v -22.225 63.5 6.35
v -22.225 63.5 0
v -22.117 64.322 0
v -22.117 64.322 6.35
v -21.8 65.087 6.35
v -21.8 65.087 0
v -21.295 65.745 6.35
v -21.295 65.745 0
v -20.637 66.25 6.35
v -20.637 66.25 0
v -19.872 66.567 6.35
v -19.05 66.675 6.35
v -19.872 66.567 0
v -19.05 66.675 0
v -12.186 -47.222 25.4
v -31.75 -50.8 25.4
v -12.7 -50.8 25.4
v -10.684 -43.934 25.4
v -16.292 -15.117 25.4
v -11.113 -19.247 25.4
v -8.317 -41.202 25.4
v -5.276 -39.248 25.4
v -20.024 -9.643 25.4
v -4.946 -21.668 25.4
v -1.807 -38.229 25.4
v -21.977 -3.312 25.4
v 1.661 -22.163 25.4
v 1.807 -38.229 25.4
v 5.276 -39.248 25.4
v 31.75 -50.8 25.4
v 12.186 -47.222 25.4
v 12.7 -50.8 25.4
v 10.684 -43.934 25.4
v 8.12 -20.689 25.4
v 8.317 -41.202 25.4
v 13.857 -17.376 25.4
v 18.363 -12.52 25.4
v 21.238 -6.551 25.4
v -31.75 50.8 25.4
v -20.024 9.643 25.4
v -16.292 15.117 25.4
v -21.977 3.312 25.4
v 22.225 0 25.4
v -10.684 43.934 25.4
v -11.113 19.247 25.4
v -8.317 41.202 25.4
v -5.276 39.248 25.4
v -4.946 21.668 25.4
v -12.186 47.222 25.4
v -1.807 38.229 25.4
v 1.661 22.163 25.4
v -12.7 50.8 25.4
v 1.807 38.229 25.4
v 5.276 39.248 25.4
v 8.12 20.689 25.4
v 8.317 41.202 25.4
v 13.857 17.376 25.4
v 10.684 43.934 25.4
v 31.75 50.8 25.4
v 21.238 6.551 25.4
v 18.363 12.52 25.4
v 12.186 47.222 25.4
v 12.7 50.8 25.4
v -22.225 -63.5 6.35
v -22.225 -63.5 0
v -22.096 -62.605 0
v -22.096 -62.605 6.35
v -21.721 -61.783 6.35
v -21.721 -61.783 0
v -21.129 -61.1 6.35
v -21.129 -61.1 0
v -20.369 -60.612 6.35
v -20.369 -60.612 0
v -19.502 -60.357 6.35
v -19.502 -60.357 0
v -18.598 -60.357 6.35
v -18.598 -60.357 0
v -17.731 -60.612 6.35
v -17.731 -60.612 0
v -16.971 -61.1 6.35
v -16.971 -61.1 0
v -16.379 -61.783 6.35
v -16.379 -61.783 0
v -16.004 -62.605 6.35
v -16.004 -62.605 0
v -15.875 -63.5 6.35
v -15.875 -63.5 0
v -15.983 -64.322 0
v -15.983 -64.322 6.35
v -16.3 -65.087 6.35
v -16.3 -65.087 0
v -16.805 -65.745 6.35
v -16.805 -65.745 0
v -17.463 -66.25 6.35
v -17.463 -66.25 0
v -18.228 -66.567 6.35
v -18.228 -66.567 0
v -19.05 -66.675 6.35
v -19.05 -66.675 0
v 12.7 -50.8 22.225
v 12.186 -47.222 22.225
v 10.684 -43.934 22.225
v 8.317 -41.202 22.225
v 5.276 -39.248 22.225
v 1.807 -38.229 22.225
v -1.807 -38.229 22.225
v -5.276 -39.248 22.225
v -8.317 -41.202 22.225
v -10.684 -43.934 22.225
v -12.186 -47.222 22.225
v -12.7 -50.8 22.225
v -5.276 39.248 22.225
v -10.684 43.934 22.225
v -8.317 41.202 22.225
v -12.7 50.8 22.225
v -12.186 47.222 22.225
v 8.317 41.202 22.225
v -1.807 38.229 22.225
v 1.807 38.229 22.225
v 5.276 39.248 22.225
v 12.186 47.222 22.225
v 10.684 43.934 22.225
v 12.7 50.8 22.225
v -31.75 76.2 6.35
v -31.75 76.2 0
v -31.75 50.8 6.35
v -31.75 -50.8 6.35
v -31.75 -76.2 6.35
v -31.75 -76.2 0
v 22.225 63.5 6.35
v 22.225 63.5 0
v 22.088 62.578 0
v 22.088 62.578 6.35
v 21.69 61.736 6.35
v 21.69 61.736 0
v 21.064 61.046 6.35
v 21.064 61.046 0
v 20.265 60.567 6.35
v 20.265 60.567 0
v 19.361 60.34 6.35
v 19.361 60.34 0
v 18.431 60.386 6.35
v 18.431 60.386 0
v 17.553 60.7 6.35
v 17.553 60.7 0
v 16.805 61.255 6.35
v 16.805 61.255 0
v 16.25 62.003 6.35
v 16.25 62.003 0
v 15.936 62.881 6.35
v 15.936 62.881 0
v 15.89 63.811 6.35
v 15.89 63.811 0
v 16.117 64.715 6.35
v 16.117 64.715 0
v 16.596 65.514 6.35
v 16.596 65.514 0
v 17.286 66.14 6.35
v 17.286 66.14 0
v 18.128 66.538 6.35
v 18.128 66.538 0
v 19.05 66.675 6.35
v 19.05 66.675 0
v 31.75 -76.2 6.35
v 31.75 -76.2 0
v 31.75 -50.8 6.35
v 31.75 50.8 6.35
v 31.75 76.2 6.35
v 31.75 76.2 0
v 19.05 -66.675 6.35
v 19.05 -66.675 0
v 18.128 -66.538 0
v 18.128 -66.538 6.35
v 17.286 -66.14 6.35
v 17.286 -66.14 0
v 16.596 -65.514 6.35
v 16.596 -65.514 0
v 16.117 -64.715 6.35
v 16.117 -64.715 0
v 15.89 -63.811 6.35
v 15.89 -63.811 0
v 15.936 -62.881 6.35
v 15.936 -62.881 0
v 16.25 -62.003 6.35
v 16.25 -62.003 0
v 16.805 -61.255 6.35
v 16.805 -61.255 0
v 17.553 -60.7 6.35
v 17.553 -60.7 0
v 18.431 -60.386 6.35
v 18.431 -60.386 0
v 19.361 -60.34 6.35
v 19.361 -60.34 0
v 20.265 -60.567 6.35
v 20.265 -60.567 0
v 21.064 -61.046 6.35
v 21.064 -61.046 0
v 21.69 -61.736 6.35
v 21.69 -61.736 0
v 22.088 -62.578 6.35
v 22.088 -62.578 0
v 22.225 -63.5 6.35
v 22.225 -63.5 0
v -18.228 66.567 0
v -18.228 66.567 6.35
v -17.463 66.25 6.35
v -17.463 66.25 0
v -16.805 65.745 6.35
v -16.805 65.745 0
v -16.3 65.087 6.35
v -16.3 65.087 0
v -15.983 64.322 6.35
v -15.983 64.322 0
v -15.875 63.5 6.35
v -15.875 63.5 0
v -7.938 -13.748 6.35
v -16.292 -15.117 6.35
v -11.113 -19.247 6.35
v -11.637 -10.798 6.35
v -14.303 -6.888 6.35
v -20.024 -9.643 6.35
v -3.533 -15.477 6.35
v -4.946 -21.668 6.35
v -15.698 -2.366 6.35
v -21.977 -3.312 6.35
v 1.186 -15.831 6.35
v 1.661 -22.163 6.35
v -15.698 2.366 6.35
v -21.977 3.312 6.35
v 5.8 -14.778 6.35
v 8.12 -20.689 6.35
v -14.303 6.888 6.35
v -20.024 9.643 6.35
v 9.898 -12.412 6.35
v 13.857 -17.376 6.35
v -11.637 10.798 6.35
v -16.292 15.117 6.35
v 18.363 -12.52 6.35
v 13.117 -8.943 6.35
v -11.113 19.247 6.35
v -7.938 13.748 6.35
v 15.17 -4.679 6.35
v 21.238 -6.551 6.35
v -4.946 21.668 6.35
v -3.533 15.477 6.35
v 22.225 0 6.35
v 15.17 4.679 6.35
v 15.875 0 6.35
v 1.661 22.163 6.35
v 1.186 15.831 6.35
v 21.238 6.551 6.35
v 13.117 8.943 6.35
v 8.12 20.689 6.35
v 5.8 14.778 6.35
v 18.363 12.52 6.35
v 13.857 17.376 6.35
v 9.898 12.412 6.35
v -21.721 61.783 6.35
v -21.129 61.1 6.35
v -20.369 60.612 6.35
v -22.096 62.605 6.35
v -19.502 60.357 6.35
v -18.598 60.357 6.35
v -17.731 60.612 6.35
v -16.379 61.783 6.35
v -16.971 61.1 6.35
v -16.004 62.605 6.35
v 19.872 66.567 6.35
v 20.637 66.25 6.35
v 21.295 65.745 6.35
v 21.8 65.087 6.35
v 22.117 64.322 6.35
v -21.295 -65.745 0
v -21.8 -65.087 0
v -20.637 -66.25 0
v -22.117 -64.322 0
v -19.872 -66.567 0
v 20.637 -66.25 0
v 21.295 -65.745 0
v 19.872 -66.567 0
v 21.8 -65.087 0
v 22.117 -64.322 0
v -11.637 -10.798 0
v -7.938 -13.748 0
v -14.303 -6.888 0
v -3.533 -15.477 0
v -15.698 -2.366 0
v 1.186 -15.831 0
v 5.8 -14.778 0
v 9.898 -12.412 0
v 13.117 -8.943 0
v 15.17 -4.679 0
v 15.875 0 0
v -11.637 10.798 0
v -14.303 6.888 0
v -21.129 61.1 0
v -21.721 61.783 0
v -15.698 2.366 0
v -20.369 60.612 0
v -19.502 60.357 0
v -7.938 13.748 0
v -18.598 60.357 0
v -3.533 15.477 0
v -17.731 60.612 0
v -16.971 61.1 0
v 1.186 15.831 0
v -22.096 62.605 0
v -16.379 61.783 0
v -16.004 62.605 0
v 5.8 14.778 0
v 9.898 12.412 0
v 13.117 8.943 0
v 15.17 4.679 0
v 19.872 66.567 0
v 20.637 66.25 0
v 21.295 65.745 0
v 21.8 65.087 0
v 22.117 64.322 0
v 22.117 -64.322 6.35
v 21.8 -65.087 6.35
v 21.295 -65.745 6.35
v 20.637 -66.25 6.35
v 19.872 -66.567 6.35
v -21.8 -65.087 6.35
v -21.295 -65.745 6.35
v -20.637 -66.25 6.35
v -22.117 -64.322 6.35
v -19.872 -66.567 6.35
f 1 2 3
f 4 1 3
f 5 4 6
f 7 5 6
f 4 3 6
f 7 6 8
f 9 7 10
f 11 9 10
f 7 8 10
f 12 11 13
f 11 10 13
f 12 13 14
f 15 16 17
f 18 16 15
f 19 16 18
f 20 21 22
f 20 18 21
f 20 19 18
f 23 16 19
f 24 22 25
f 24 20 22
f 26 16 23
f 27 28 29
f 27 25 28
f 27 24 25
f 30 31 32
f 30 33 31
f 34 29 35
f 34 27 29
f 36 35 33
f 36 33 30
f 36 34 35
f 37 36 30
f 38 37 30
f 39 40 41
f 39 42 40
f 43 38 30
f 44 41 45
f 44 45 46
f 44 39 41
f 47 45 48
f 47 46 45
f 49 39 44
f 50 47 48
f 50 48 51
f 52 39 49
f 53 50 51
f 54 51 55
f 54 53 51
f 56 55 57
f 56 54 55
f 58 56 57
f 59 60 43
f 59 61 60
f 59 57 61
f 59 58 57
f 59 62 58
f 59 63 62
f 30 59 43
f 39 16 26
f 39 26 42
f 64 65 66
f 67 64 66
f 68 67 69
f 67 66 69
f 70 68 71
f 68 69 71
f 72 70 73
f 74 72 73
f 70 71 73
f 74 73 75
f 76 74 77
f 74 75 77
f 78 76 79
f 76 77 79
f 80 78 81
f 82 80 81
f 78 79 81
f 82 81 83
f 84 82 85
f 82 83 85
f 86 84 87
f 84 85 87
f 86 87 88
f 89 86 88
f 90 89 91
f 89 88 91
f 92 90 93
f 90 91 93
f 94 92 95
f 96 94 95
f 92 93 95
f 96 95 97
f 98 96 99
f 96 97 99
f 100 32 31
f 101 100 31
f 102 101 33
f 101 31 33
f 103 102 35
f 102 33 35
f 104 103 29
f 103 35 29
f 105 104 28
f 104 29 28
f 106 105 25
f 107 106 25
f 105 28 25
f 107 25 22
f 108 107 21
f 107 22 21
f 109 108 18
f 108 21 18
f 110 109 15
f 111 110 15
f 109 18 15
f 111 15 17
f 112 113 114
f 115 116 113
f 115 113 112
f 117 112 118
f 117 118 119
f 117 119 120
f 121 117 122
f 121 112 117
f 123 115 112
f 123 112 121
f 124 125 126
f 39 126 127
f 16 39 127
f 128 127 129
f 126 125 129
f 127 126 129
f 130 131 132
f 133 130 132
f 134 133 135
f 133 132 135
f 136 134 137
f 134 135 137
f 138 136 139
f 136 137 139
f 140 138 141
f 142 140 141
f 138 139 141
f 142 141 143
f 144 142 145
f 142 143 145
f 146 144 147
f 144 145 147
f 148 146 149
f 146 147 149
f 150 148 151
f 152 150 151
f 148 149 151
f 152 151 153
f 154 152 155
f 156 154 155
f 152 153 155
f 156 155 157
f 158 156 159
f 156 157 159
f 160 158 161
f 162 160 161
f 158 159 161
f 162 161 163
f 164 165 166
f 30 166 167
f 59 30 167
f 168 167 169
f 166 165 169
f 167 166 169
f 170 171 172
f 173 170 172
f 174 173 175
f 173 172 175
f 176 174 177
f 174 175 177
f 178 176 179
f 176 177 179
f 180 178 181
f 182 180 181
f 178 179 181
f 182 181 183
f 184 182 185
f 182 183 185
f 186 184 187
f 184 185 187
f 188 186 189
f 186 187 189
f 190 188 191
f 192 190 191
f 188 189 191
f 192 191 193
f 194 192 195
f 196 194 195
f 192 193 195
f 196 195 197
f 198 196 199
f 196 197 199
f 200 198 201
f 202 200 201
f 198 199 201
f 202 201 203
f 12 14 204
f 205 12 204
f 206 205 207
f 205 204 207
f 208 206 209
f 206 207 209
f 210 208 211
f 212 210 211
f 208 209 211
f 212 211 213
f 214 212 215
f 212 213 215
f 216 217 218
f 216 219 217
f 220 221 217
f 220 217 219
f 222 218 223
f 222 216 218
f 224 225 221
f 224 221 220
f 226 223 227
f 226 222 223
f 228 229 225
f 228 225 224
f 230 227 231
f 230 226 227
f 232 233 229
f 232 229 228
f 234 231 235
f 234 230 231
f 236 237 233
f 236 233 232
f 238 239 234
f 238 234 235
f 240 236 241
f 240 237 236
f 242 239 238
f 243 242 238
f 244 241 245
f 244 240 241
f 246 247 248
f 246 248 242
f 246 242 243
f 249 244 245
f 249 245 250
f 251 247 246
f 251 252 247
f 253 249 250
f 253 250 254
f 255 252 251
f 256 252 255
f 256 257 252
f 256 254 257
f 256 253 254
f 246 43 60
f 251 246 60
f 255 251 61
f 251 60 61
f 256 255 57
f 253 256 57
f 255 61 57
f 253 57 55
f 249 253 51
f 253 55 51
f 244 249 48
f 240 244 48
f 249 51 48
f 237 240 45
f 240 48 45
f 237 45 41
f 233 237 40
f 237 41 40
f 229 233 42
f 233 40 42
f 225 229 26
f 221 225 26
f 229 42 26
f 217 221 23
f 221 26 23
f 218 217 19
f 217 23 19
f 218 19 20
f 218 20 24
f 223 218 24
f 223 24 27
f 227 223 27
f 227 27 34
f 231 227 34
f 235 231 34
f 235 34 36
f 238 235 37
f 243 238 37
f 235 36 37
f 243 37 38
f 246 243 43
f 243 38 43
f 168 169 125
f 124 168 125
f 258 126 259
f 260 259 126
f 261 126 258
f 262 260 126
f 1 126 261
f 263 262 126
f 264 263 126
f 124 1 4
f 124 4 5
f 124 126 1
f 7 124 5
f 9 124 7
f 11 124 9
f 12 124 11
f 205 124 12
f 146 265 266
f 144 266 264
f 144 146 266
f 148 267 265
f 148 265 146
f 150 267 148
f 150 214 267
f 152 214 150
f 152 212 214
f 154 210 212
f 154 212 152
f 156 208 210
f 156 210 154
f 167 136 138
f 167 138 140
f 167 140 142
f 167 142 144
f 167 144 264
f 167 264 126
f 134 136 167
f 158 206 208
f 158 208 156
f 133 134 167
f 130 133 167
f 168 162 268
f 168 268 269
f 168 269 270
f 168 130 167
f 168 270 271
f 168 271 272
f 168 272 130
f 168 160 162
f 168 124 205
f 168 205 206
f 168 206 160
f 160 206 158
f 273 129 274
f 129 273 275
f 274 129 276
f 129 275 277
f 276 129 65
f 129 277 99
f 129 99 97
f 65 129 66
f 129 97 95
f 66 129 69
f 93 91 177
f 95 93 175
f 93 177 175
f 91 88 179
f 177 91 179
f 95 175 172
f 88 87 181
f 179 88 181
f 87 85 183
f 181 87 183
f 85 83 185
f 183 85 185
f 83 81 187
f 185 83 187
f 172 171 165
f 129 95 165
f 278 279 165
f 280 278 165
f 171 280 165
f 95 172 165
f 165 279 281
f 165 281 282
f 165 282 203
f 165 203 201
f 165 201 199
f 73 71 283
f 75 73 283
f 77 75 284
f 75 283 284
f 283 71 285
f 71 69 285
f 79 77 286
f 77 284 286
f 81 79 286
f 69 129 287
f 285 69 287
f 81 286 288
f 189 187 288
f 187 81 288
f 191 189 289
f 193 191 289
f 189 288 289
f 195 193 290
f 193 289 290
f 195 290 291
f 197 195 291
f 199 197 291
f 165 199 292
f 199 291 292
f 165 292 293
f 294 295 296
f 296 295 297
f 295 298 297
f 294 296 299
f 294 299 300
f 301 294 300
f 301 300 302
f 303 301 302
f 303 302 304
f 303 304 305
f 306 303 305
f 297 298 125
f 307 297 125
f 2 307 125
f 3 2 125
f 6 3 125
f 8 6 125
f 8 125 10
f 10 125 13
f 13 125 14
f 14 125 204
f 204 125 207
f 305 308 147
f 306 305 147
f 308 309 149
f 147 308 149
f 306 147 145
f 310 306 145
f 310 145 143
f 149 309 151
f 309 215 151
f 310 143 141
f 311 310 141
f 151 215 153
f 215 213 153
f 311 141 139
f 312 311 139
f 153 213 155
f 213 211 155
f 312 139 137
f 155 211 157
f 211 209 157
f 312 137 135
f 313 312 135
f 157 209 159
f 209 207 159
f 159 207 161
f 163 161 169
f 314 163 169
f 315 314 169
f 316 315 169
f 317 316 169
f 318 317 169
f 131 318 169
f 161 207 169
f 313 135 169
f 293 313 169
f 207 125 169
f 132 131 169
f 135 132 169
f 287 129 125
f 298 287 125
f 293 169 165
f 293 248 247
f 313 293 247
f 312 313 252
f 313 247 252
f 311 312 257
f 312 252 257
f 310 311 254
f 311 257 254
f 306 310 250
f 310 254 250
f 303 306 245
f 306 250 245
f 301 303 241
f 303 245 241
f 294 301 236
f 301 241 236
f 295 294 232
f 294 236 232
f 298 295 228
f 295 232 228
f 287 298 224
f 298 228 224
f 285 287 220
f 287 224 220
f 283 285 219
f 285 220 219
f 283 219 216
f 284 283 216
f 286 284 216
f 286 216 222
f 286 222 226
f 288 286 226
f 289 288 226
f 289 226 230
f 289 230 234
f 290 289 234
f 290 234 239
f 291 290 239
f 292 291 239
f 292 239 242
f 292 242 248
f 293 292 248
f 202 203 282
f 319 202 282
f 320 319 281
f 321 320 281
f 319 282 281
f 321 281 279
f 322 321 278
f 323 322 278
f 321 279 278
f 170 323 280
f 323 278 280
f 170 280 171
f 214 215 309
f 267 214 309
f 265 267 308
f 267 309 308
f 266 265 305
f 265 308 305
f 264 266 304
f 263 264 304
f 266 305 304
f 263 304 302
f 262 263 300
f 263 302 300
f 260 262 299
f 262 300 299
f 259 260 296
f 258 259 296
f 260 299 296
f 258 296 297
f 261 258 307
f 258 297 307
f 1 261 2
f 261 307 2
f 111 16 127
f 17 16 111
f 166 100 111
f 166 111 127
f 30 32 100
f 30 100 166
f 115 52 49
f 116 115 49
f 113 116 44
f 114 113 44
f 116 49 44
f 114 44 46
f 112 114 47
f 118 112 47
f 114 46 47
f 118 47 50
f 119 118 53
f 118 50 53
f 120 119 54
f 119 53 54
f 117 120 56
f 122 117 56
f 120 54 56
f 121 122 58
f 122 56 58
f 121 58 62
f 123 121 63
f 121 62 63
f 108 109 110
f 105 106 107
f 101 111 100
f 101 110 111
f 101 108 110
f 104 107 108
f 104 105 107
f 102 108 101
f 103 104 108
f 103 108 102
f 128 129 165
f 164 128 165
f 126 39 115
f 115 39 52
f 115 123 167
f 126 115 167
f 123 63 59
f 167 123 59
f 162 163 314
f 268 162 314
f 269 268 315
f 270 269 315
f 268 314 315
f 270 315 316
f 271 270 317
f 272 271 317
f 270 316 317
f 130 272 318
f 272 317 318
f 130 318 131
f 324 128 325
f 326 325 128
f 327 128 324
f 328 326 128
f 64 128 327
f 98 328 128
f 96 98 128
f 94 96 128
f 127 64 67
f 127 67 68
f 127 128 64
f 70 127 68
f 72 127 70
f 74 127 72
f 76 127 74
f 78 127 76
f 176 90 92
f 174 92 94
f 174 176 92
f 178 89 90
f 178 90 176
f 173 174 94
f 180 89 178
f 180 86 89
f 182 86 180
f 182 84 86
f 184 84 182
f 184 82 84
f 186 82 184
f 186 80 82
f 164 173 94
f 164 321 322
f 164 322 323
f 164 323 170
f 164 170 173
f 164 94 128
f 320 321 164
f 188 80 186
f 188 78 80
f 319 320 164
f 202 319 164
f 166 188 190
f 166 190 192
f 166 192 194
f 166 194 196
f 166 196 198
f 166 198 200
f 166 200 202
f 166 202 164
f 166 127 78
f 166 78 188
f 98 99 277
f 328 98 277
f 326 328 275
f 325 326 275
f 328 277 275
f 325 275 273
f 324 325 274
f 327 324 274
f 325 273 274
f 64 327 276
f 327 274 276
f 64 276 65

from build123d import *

# Parameters (mm, degrees)
BOSS_EXTRUDE1_DEPTH = 25.4
SKETCH2_W           = 63.5
SKETCH2_H           = 25.4
CUT_EXTRUDE1_DEPTH  = 19.05
SKETCH3_R           = 15.875
CUT_EXTRUDE4_DEPTH  = 26.4
SKETCH5_R           = 22.225
SKETCH5_R_2         = 15.875
CUT_EXTRUDE6_DEPTH  = 19.05
SKETCH6_R           = 12.7
CUT_EXTRUDE7_DEPTH  = 3.175
BOSS_EXTRUDE2_DEPTH = 25.4
SKETCH9_W           = 19.05
SKETCH9_H           = 3.556
BOSS_EXTRUDE4_DEPTH = 35.56


with BuildPart() as part:
    # Sketch1 → Boss-Extrude1 (new body)
    with BuildSketch(Plane.XY):
        with BuildLine():
            Line((-19.05, -66.675), (-19.05, -76.2))
            Line((-19.05, -76.2), (19.05, -76.2))
            Line((19.05, -76.2), (19.05, -66.675))
            ThreePointArc((19.05, -66.675), (16.80493597, -61.25493597), (22.225, -63.5))
            Line((22.225, -63.5), (31.75, -63.5))
            Line((31.75, -63.5), (31.75, 63.5))
            Line((31.75, 63.5), (22.225, 63.5))
            ThreePointArc((22.225, 63.5), (16.80493597, 61.25493597), (19.05, 66.675))
            Line((19.05, 66.675), (19.05, 76.2))
            Line((19.05, 76.2), (-19.05, 76.2))
            Line((-19.05, 76.2), (-19.05, 66.675))
            ThreePointArc((-19.05, 66.675), (-16.80493597, 65.74506403), (-15.875, 63.5))
            ThreePointArc((-15.875, 63.5), (-19.05, 60.325), (-22.225, 63.5))
            Line((-22.225, 63.5), (-31.75, 63.5))
            Line((-31.75, 63.5), (-31.75, -63.5))
            Line((-31.75, -63.5), (-22.225, -63.5))
            ThreePointArc((-22.225, -63.5), (-19.05, -60.325), (-15.875, -63.5))
            ThreePointArc((-15.875, -63.5), (-16.80493597, -65.74506403), (-19.05, -66.675))
        make_face()
        with BuildLine():
            Line((-31.75, 76.2), (-31.75, 63.5))
            Line((-31.75, 63.5), (-22.225, 63.5))
            ThreePointArc((-22.225, 63.5), (-21.29506403, 65.74506403), (-19.05, 66.675))
            Line((-19.05, 66.675), (-19.05, 76.2))
            Line((-19.05, 76.2), (-31.75, 76.2))
        make_face()
        with BuildLine():
            Line((22.225, 63.5), (31.75, 63.5))
            Line((31.75, 63.5), (31.75, 76.2))
            Line((31.75, 76.2), (19.05, 76.2))
            Line((19.05, 76.2), (19.05, 66.675))
            ThreePointArc((19.05, 66.675), (21.29506403, 65.74506403), (22.225, 63.5))
        make_face()
        with BuildLine():
            Line((-31.75, -63.5), (-31.75, -76.2))
            Line((-31.75, -76.2), (-19.05, -76.2))
            Line((-19.05, -76.2), (-19.05, -66.675))
            ThreePointArc((-19.05, -66.675), (-21.29506403, -65.74506403), (-22.225, -63.5))
            Line((-22.225, -63.5), (-31.75, -63.5))
        make_face()
        with BuildLine():
            Line((19.05, -66.675), (19.05, -76.2))
            Line((19.05, -76.2), (31.75, -76.2))
            Line((31.75, -76.2), (31.75, -63.5))
            Line((31.75, -63.5), (22.225, -63.5))
            ThreePointArc((22.225, -63.5), (21.29506403, -65.74506403), (19.05, -66.675))
        make_face()
    extrude(amount=BOSS_EXTRUDE1_DEPTH)

    # Sketch2 → Cut-Extrude1 (cut)
    with BuildSketch(Plane.XY.offset(25.4)):
        with Locations((0, 63.5)):
            Rectangle(SKETCH2_W, SKETCH2_H)
        with Locations((0, -63.5)):
            Rectangle(SKETCH2_W, SKETCH2_H)
    extrude(amount=-CUT_EXTRUDE1_DEPTH, mode=Mode.SUBTRACT)

    # Sketch3 → Cut-Extrude4 (cut, through all)
    with BuildSketch(Plane.XY.offset(25.4)):
        Circle(SKETCH3_R)
    extrude(amount=-CUT_EXTRUDE4_DEPTH, mode=Mode.SUBTRACT)

    # Sketch5 → Cut-Extrude6 (cut)
    with BuildSketch(Plane.XY.offset(25.4)):
        Circle(SKETCH5_R)
        Circle(SKETCH5_R_2, mode=Mode.SUBTRACT)
    extrude(amount=-CUT_EXTRUDE6_DEPTH, mode=Mode.SUBTRACT)

    # Sketch6 → Cut-Extrude7 (cut)
    with BuildSketch(Plane.XY.offset(25.4)):
        with Locations((0, -50.8)):
            Circle(SKETCH6_R)
        with Locations((0, 50.8)):
            Circle(SKETCH6_R)
    extrude(amount=-CUT_EXTRUDE7_DEPTH, mode=Mode.SUBTRACT)


with BuildPart() as body_2:
    # Sketch7 → Boss-Extrude2 (new body)
    with BuildSketch(Plane.ZY.offset(31.75)):
        Polygon((0, 123.19), (19.05, 123.19), (19.05, -50.8), (6.35, -50.8), (6.35, -76.2), (0, -76.2), align=None)
    extrude(amount=BOSS_EXTRUDE2_DEPTH)

    # Sketch9 → Boss-Extrude4 (add)
    with BuildSketch(Plane.ZY.offset(57.15)):
        with Locations((9.525, 121.412)):
            Rectangle(SKETCH9_W, SKETCH9_H)
        with Locations((9.525, 110.236)):
            Rectangle(SKETCH9_W, SKETCH9_H)
    extrude(amount=BOSS_EXTRUDE4_DEPTH)


solid = part.part
